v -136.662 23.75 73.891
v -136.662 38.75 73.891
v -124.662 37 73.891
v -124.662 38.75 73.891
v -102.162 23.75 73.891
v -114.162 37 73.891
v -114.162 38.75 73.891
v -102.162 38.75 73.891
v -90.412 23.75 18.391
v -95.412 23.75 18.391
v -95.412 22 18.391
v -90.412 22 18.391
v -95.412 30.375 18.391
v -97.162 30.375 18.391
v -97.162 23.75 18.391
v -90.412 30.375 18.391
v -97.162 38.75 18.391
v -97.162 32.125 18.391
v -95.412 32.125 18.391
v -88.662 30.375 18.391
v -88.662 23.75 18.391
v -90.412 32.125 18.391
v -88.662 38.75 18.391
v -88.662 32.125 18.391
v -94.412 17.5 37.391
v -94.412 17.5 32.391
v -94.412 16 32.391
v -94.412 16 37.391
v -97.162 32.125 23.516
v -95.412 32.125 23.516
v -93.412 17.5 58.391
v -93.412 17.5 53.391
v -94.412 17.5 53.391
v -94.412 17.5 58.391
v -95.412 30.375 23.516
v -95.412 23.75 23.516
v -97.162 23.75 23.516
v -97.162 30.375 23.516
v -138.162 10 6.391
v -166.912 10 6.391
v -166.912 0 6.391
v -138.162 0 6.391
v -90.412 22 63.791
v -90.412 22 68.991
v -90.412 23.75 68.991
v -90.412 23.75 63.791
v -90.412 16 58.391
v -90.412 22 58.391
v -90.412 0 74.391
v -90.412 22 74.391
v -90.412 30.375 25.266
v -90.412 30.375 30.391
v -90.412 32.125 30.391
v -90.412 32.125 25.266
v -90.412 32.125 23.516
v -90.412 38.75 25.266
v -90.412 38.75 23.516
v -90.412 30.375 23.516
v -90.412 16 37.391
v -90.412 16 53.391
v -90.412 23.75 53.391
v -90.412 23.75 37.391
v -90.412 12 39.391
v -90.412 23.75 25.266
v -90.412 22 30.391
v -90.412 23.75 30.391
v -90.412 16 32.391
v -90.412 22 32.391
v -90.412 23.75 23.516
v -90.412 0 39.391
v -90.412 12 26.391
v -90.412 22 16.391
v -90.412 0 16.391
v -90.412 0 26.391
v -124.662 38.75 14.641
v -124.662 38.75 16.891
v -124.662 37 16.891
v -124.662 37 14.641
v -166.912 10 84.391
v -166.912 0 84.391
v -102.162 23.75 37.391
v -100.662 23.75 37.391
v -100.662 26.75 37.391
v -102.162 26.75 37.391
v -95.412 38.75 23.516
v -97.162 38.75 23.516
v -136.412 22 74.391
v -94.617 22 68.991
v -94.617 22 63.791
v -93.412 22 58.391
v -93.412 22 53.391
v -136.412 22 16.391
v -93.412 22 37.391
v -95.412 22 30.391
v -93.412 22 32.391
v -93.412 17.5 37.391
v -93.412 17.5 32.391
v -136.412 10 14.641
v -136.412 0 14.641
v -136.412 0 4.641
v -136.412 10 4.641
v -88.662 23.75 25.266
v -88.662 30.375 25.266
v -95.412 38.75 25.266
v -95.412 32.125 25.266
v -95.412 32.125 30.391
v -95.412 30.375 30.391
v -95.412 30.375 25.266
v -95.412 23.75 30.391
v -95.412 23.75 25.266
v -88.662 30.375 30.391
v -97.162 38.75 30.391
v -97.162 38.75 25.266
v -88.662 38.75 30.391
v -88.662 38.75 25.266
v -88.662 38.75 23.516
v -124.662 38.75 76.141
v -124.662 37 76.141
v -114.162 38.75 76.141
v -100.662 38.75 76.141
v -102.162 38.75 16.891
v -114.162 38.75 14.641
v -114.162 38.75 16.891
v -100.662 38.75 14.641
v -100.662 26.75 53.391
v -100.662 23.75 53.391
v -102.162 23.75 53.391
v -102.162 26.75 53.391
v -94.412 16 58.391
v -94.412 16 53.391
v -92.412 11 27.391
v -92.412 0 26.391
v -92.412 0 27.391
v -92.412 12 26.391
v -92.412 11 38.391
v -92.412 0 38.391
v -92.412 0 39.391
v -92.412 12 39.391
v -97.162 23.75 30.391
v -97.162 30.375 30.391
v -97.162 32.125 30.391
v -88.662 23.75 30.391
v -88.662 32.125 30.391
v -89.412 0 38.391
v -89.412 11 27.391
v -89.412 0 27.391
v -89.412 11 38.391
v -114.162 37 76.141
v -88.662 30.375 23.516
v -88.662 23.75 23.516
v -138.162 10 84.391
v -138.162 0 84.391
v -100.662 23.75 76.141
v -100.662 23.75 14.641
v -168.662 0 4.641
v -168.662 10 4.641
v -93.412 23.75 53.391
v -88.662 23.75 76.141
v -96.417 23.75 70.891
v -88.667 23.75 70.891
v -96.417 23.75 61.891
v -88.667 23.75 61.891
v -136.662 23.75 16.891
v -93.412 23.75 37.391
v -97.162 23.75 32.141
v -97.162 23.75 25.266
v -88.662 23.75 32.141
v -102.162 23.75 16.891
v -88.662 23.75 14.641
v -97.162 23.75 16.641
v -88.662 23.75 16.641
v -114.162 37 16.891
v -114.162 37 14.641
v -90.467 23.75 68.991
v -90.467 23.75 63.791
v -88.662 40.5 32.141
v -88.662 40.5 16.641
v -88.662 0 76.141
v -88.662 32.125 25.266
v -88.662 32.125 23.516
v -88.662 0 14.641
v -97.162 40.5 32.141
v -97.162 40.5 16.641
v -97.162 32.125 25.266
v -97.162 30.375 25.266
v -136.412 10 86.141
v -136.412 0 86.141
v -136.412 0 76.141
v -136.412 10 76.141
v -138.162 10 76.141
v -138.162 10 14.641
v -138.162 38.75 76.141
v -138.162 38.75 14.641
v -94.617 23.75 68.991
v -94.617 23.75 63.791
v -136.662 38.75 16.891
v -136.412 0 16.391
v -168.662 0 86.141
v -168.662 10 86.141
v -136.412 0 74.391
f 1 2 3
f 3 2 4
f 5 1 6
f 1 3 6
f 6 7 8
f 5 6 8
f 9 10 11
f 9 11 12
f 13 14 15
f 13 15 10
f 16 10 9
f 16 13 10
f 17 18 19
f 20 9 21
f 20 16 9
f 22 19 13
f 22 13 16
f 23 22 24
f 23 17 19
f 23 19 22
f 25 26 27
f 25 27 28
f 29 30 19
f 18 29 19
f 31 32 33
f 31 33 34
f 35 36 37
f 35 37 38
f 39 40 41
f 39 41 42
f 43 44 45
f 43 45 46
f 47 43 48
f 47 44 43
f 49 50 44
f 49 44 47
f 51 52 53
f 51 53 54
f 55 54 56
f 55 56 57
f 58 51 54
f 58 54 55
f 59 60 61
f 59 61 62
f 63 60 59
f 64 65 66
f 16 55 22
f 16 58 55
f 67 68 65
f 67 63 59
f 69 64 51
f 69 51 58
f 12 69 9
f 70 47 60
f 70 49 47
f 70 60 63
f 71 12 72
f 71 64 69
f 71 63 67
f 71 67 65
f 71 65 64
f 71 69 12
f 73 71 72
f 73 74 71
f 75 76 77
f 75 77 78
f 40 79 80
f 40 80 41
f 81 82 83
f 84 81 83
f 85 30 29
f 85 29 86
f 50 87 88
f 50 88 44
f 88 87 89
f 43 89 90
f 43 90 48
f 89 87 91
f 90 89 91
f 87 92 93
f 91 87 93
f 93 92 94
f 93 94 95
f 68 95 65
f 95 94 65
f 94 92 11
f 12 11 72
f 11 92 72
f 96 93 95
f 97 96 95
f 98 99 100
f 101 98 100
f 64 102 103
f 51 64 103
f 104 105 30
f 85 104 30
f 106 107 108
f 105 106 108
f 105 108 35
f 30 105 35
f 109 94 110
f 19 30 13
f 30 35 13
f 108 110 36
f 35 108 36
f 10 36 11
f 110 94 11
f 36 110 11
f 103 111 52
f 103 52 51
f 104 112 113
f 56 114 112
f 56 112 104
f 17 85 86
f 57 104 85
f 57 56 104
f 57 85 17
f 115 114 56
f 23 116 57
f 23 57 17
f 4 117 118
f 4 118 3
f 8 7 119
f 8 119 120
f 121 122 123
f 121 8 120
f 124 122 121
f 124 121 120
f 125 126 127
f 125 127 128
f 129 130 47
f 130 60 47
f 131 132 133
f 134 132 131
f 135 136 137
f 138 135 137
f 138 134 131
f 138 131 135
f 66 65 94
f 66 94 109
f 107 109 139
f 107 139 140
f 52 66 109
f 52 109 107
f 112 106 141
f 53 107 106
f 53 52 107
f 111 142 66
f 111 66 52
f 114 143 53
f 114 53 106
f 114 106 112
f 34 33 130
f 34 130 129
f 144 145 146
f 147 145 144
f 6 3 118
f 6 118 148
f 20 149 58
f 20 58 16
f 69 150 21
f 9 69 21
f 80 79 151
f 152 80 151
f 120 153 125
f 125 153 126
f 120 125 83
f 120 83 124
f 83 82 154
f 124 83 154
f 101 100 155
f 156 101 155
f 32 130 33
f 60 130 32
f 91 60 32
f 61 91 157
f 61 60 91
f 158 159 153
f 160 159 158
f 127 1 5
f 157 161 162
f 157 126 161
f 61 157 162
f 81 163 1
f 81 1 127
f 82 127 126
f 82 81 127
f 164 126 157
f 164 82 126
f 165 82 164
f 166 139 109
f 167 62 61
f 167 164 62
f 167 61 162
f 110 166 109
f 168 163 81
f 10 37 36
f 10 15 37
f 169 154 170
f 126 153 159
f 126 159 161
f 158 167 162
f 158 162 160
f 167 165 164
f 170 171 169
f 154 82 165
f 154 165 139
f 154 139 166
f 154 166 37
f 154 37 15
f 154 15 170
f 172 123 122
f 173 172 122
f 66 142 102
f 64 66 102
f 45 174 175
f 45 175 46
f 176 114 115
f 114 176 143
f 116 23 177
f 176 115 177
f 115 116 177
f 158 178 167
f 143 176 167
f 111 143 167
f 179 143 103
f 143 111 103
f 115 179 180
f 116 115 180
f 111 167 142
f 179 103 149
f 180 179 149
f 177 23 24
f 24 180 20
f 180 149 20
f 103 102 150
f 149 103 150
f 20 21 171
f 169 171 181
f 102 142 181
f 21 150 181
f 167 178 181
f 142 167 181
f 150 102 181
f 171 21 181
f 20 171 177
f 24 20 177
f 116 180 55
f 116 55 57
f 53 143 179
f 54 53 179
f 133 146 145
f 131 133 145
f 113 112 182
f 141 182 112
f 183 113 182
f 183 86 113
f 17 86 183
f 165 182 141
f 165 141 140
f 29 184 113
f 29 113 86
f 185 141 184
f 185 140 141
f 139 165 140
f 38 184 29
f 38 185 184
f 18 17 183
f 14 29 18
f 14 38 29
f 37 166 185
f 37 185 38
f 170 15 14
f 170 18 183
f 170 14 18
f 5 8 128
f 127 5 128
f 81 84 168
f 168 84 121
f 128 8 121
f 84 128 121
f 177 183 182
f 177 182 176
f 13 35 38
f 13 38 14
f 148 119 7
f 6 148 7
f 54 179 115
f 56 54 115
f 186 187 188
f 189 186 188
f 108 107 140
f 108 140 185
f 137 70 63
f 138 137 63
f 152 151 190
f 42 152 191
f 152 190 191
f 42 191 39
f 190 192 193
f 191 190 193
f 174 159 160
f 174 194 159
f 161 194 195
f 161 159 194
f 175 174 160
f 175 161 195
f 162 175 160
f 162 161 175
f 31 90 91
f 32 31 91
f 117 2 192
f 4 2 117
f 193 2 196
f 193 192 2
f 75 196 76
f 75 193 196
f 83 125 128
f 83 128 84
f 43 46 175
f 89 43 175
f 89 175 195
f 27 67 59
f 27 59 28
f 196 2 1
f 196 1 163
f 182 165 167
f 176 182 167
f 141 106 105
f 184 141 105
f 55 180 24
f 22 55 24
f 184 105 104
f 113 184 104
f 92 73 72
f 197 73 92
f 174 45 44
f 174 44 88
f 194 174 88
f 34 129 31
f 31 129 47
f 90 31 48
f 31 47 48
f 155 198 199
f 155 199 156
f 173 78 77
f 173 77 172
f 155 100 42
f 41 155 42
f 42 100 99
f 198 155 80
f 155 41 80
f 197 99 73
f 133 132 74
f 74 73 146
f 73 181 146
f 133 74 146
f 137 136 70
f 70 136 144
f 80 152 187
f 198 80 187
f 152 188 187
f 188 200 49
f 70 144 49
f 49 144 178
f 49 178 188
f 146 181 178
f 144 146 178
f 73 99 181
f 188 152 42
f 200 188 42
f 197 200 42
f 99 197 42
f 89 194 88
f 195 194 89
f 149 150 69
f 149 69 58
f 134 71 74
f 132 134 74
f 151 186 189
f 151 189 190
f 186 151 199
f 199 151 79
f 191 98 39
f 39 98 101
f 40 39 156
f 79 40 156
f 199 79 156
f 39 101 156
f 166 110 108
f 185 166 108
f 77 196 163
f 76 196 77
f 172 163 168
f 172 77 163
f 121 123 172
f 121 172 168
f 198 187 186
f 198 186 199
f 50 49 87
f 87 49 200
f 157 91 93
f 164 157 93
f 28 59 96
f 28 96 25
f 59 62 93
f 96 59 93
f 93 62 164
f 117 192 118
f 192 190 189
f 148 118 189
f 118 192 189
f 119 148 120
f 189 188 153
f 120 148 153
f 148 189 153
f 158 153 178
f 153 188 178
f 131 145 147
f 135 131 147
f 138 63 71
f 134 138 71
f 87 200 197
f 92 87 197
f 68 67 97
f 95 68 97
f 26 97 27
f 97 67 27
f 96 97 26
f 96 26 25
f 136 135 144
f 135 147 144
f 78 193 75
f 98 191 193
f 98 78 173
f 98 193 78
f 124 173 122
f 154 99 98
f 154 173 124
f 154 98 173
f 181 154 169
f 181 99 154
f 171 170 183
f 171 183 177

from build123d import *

# Parameters (mm, degrees)
SKETCH1_W               = 49.5
SKETCH1_H               = 61.5
BOSS_EXTRUDE1_DEPTH     = 23.75
SKETCH2_W               = 46
SKETCH2_H               = 58
CUT_EXTRUDE1_DEPTH      = 22
SKETCH3_W               = 3
SKETCH3_H               = 16
CUT_EXTRUDE2_DEPTH      = 1.75
SKETCH7_W               = 3
SKETCH7_H               = 5
BOSS_EXTRUDE2_DEPTH     = 6
SKETCH11_W              = 37.5
SKETCH11_H              = 61.5
BOSS_EXTRUDE3_DEPTH     = 15
SKETCH12_W              = 34.5
SKETCH12_H              = 57
CUT_EXTRUDE3_DEPTH      = 15
SKETCH14_W              = 7.75
SKETCH14_H              = 9
BOSS_EXTRUDE4_DEPTH     = 0.0001
SKETCH15_W              = 4.15
SKETCH15_H              = 5.2
CUT_EXTRUDE4_DEPTH      = 4.75
SKETCH16_W              = 8.5
SKETCH16_H              = 15.5
BOSS_EXTRUDE5_DEPTH     = 16.75
SKETCH17_W              = 5.125
SKETCH17_H              = 6.625
CUT_EXTRUDE5_DEPTH      = 8.5
CUT_EXTRUDE6_DEPTH      = 15
CUT_EXTRUDE6_DEPTH_BACK = 1.75
SKETCH18_W              = 5
SKETCH18_H              = 12
SKETCH20_W              = 16
SKETCH20_H              = 3
CUT_EXTRUDE7_DEPTH      = 1.75
SKETCH21_W              = 32.25
SKETCH21_H              = 81.5
BOSS_EXTRUDE7_DEPTH     = 10
SKETCH23_W              = 28.75
SKETCH23_H              = 78
CUT_EXTRUDE8_DEPTH      = 10
SKETCH25_W              = 3
SKETCH25_H              = 5.4
BOSS_EXTRUDE8_DEPTH     = 1.75
SKETCH28_W              = 3
SKETCH28_H              = 2
BOSS_EXTRUDE9_DEPTH     = 1.75
SKETCH30_W              = 5
SKETCH30_H              = 1.5
BOSS_EXTRUDE11_DEPTH    = 1
SKETCH32_W              = 10.5
SKETCH32_H              = 2.25
CUT_EXTRUDE9_DEPTH      = 1.75
SKETCH33_W              = 11
SKETCH33_H              = 11
CUT_EXTRUDE10_DEPTH     = 1
BOSS_EXTRUDE12_DEPTH    = 2


with BuildPart() as part:
    # Sketch1 → Boss-Extrude1 (new body)
    with BuildSketch(Plane(origin=(0, 0, 0), x_dir=(1, 0, 0), z_dir=(0, 1, 0))):
        with Locations((-113.412024913, -45.391200727)):
            Rectangle(SKETCH1_W, SKETCH1_H)
    extrude(amount=BOSS_EXTRUDE1_DEPTH)

    # Sketch2 → Cut-Extrude1 (cut)
    with BuildSketch(Plane(origin=(0, 0, 0), x_dir=(-1, 0, 0), z_dir=(0, -1, 0))):
        with Locations((113.412024913, -45.391200727)):
            Rectangle(SKETCH2_W, SKETCH2_H)
    extrude(amount=-CUT_EXTRUDE1_DEPTH, mode=Mode.SUBTRACT)

    # Sketch3 → Cut-Extrude2 (cut)
    with BuildSketch(Plane(origin=(0, 22, 0), x_dir=(-1, 0, 0), z_dir=(0, -1, 0))):
        with Locations((91.912024913, -66.391200727)):
            Rectangle(SKETCH3_W, SKETCH3_H)
        with Locations((91.912024913, -45.391200727)):
            Rectangle(SKETCH3_W, SKETCH3_H)
        with Locations((91.912024913, -24.391200727)):
            Rectangle(SKETCH3_W, SKETCH3_H)
    extrude(amount=-CUT_EXTRUDE2_DEPTH, mode=Mode.SUBTRACT)

    # Sketch7 → Boss-Extrude2 (add)
    with BuildSketch(Plane(origin=(0, 22, 0), x_dir=(-1, 0, 0), z_dir=(0, -1, 0))):
        with Locations((91.912024913, -55.891200727)):
            Rectangle(SKETCH7_W, SKETCH7_H)
        with Locations((91.912024913, -34.891200727)):
            Rectangle(SKETCH7_W, SKETCH7_H)
    extrude(amount=BOSS_EXTRUDE2_DEPTH)

    # Sketch11 → Boss-Extrude3 (add)
    with BuildSketch(Plane(origin=(0, 23.75, 0), x_dir=(1, 0, 0), z_dir=(0, 1, 0))):
        with Locations((-119.412024913, -45.391200727)):
            Rectangle(SKETCH11_W, SKETCH11_H)
    extrude(amount=BOSS_EXTRUDE3_DEPTH)

    # Sketch12 → Cut-Extrude3 (cut)
    with BuildSketch(Plane(origin=(0, 38.75, 0), x_dir=(1, 0, 0), z_dir=(0, 1, 0))):
        with Locations((-119.412024913, -45.391200727)):
            Rectangle(SKETCH12_W, SKETCH12_H)
    extrude(amount=-CUT_EXTRUDE3_DEPTH, mode=Mode.SUBTRACT)

    # Sketch14 → Boss-Extrude4 (add)
    with BuildSketch(Plane(origin=(0, 23.75, 0), x_dir=(1, 0, 0), z_dir=(0, 1, 0))):
        with Locations((-92.542024913, -66.391200727)):
            Rectangle(SKETCH14_W, SKETCH14_H)
    extrude(amount=BOSS_EXTRUDE4_DEPTH)

    # Sketch15 → Cut-Extrude4 (cut)
    with BuildSketch(Plane(origin=(0, 23.7501, 0), x_dir=(1, 0, 0), z_dir=(0, 1, 0))):
        with Locations((-92.542024913, -66.391200727)):
            Rectangle(SKETCH15_W, SKETCH15_H)
    extrude(amount=-CUT_EXTRUDE4_DEPTH, mode=Mode.SUBTRACT)

    # Sketch16 → Boss-Extrude5 (add)
    with BuildSketch(Plane(origin=(0, 23.75, 0), x_dir=(1, 0, 0), z_dir=(0, 1, 0))):
        with Locations((-92.912024913, -24.391200727)):
            Rectangle(SKETCH16_W, SKETCH16_H)
    extrude(amount=BOSS_EXTRUDE5_DEPTH)

    # Sketch17 → Cut-Extrude5 (cut)
    with BuildSketch(Plane(origin=(-88.662024913, 0, 0), x_dir=(0, 0, -1), z_dir=(1, 0, 0))):
        with Locations((-27.828700727, 35.4375)):
            Rectangle(SKETCH17_W, SKETCH17_H)
        with Locations((-27.828700727, 27.0625)):
            Rectangle(SKETCH17_W, SKETCH17_H)
        with Locations((-20.953700727, 35.4375)):
            Rectangle(SKETCH17_W, SKETCH17_H)
        with Locations((-20.953700727, 27.0625)):
            Rectangle(SKETCH17_W, SKETCH17_H)
    extrude(amount=-CUT_EXTRUDE5_DEPTH, mode=Mode.SUBTRACT)

    # Sketch18 → Cut-Extrude6 (cut, two sides: drawn at the far end of the back side and taken through both)
    with BuildSketch(Plane(origin=(0, 23.75, 0), x_dir=(1, 0, 0), z_dir=(0, 1, 0)).offset(-CUT_EXTRUDE6_DEPTH_BACK)):
        with Locations((-92.912024913, -24.391200727)):
            Rectangle(SKETCH18_W, SKETCH18_H)
    extrude(amount=CUT_EXTRUDE6_DEPTH + CUT_EXTRUDE6_DEPTH_BACK, mode=Mode.SUBTRACT)

    # Sketch20 → Cut-Extrude7 (cut)
    with BuildSketch(Plane(origin=(-100.662024913, 0, 0), x_dir=(0, 0, -1), z_dir=(1, 0, 0))):
        with Locations((-45.391200727, 25.25)):
            Rectangle(SKETCH20_W, SKETCH20_H)
    extrude(amount=-CUT_EXTRUDE7_DEPTH, mode=Mode.SUBTRACT)

    # Sketch21 → Boss-Extrude7 (add)
    with BuildSketch(Plane(origin=(0, 0, 0), x_dir=(-1, 0, 0), z_dir=(0, -1, 0))):
        with Locations((152.537024913, -45.391200727)):
            Rectangle(SKETCH21_W, SKETCH21_H)
    extrude(amount=-BOSS_EXTRUDE7_DEPTH)

    # Sketch23 → Cut-Extrude8 (cut)
    with BuildSketch(Plane(origin=(0, 10, 0), x_dir=(1, 0, 0), z_dir=(0, 1, 0))):
        with Locations((-152.537024913, -45.391200727)):
            Rectangle(SKETCH23_W, SKETCH23_H)
    extrude(amount=-CUT_EXTRUDE8_DEPTH, mode=Mode.SUBTRACT)

    # Sketch25 → Boss-Extrude8 (add)
    with BuildSketch(Plane(origin=(0, 22, 0), x_dir=(-1, 0, 0), z_dir=(0, -1, 0))):
        with Locations((91.912024913, -61.091200727)):
            Rectangle(SKETCH25_W, SKETCH25_H)
        with Locations((91.912024913, -71.691200727)):
            Rectangle(SKETCH25_W, SKETCH25_H)
    extrude(amount=-BOSS_EXTRUDE8_DEPTH)

    # Sketch28 → Boss-Extrude9 (add)
    with BuildSketch(Plane(origin=(0, 23.75, 0), x_dir=(1, 0, 0), z_dir=(0, 1, 0))):
        with Locations((-91.912024913, -17.391200727)):
            Rectangle(SKETCH28_W, SKETCH28_H)
        with Locations((-91.912024913, -31.391200727)):
            Rectangle(SKETCH28_W, SKETCH28_H)
    extrude(amount=-BOSS_EXTRUDE9_DEPTH)

    # Sketch30 → Boss-Extrude11 (add)
    with BuildSketch(Plane.ZY.offset(93.412024913)):
        with Locations((55.891200727, 16.75)):
            Rectangle(SKETCH30_W, SKETCH30_H)
        with Locations((34.891200727, 16.75)):
            Rectangle(SKETCH30_W, SKETCH30_H)
    extrude(amount=BOSS_EXTRUDE11_DEPTH)

    # Sketch32 → Cut-Extrude9 (cut)
    with BuildSketch(Plane(origin=(0, 38.75, 0), x_dir=(1, 0, 0), z_dir=(0, 1, 0))):
        with Locations((-119.412024913, -75.016200727)):
            Rectangle(SKETCH32_W, SKETCH32_H)
        with Locations((-119.412024913, -15.766200727)):
            Rectangle(SKETCH32_W, SKETCH32_H)
    extrude(amount=-CUT_EXTRUDE9_DEPTH, mode=Mode.SUBTRACT)

    # Sketch33 → Cut-Extrude10 (cut)
    with BuildSketch(Plane.ZY.offset(90.412024913)):
        with Locations((32.891200727, 5.5)):
            Rectangle(SKETCH33_W, SKETCH33_H)
    extrude(amount=-CUT_EXTRUDE10_DEPTH, mode=Mode.SUBTRACT)

    # Sketch34 → Boss-Extrude12 (add)
    with BuildSketch(Plane.ZY.offset(90.412024913)):
        Polygon((26.391200727, 0), (27.391200727, 0), (27.391200727, 11), (38.391200727, 11), (38.391200727, 0), (39.391200727, 0), (39.391200727, 12), (26.391200727, 12), align=None)
    extrude(amount=BOSS_EXTRUDE12_DEPTH)


solid = part.part
